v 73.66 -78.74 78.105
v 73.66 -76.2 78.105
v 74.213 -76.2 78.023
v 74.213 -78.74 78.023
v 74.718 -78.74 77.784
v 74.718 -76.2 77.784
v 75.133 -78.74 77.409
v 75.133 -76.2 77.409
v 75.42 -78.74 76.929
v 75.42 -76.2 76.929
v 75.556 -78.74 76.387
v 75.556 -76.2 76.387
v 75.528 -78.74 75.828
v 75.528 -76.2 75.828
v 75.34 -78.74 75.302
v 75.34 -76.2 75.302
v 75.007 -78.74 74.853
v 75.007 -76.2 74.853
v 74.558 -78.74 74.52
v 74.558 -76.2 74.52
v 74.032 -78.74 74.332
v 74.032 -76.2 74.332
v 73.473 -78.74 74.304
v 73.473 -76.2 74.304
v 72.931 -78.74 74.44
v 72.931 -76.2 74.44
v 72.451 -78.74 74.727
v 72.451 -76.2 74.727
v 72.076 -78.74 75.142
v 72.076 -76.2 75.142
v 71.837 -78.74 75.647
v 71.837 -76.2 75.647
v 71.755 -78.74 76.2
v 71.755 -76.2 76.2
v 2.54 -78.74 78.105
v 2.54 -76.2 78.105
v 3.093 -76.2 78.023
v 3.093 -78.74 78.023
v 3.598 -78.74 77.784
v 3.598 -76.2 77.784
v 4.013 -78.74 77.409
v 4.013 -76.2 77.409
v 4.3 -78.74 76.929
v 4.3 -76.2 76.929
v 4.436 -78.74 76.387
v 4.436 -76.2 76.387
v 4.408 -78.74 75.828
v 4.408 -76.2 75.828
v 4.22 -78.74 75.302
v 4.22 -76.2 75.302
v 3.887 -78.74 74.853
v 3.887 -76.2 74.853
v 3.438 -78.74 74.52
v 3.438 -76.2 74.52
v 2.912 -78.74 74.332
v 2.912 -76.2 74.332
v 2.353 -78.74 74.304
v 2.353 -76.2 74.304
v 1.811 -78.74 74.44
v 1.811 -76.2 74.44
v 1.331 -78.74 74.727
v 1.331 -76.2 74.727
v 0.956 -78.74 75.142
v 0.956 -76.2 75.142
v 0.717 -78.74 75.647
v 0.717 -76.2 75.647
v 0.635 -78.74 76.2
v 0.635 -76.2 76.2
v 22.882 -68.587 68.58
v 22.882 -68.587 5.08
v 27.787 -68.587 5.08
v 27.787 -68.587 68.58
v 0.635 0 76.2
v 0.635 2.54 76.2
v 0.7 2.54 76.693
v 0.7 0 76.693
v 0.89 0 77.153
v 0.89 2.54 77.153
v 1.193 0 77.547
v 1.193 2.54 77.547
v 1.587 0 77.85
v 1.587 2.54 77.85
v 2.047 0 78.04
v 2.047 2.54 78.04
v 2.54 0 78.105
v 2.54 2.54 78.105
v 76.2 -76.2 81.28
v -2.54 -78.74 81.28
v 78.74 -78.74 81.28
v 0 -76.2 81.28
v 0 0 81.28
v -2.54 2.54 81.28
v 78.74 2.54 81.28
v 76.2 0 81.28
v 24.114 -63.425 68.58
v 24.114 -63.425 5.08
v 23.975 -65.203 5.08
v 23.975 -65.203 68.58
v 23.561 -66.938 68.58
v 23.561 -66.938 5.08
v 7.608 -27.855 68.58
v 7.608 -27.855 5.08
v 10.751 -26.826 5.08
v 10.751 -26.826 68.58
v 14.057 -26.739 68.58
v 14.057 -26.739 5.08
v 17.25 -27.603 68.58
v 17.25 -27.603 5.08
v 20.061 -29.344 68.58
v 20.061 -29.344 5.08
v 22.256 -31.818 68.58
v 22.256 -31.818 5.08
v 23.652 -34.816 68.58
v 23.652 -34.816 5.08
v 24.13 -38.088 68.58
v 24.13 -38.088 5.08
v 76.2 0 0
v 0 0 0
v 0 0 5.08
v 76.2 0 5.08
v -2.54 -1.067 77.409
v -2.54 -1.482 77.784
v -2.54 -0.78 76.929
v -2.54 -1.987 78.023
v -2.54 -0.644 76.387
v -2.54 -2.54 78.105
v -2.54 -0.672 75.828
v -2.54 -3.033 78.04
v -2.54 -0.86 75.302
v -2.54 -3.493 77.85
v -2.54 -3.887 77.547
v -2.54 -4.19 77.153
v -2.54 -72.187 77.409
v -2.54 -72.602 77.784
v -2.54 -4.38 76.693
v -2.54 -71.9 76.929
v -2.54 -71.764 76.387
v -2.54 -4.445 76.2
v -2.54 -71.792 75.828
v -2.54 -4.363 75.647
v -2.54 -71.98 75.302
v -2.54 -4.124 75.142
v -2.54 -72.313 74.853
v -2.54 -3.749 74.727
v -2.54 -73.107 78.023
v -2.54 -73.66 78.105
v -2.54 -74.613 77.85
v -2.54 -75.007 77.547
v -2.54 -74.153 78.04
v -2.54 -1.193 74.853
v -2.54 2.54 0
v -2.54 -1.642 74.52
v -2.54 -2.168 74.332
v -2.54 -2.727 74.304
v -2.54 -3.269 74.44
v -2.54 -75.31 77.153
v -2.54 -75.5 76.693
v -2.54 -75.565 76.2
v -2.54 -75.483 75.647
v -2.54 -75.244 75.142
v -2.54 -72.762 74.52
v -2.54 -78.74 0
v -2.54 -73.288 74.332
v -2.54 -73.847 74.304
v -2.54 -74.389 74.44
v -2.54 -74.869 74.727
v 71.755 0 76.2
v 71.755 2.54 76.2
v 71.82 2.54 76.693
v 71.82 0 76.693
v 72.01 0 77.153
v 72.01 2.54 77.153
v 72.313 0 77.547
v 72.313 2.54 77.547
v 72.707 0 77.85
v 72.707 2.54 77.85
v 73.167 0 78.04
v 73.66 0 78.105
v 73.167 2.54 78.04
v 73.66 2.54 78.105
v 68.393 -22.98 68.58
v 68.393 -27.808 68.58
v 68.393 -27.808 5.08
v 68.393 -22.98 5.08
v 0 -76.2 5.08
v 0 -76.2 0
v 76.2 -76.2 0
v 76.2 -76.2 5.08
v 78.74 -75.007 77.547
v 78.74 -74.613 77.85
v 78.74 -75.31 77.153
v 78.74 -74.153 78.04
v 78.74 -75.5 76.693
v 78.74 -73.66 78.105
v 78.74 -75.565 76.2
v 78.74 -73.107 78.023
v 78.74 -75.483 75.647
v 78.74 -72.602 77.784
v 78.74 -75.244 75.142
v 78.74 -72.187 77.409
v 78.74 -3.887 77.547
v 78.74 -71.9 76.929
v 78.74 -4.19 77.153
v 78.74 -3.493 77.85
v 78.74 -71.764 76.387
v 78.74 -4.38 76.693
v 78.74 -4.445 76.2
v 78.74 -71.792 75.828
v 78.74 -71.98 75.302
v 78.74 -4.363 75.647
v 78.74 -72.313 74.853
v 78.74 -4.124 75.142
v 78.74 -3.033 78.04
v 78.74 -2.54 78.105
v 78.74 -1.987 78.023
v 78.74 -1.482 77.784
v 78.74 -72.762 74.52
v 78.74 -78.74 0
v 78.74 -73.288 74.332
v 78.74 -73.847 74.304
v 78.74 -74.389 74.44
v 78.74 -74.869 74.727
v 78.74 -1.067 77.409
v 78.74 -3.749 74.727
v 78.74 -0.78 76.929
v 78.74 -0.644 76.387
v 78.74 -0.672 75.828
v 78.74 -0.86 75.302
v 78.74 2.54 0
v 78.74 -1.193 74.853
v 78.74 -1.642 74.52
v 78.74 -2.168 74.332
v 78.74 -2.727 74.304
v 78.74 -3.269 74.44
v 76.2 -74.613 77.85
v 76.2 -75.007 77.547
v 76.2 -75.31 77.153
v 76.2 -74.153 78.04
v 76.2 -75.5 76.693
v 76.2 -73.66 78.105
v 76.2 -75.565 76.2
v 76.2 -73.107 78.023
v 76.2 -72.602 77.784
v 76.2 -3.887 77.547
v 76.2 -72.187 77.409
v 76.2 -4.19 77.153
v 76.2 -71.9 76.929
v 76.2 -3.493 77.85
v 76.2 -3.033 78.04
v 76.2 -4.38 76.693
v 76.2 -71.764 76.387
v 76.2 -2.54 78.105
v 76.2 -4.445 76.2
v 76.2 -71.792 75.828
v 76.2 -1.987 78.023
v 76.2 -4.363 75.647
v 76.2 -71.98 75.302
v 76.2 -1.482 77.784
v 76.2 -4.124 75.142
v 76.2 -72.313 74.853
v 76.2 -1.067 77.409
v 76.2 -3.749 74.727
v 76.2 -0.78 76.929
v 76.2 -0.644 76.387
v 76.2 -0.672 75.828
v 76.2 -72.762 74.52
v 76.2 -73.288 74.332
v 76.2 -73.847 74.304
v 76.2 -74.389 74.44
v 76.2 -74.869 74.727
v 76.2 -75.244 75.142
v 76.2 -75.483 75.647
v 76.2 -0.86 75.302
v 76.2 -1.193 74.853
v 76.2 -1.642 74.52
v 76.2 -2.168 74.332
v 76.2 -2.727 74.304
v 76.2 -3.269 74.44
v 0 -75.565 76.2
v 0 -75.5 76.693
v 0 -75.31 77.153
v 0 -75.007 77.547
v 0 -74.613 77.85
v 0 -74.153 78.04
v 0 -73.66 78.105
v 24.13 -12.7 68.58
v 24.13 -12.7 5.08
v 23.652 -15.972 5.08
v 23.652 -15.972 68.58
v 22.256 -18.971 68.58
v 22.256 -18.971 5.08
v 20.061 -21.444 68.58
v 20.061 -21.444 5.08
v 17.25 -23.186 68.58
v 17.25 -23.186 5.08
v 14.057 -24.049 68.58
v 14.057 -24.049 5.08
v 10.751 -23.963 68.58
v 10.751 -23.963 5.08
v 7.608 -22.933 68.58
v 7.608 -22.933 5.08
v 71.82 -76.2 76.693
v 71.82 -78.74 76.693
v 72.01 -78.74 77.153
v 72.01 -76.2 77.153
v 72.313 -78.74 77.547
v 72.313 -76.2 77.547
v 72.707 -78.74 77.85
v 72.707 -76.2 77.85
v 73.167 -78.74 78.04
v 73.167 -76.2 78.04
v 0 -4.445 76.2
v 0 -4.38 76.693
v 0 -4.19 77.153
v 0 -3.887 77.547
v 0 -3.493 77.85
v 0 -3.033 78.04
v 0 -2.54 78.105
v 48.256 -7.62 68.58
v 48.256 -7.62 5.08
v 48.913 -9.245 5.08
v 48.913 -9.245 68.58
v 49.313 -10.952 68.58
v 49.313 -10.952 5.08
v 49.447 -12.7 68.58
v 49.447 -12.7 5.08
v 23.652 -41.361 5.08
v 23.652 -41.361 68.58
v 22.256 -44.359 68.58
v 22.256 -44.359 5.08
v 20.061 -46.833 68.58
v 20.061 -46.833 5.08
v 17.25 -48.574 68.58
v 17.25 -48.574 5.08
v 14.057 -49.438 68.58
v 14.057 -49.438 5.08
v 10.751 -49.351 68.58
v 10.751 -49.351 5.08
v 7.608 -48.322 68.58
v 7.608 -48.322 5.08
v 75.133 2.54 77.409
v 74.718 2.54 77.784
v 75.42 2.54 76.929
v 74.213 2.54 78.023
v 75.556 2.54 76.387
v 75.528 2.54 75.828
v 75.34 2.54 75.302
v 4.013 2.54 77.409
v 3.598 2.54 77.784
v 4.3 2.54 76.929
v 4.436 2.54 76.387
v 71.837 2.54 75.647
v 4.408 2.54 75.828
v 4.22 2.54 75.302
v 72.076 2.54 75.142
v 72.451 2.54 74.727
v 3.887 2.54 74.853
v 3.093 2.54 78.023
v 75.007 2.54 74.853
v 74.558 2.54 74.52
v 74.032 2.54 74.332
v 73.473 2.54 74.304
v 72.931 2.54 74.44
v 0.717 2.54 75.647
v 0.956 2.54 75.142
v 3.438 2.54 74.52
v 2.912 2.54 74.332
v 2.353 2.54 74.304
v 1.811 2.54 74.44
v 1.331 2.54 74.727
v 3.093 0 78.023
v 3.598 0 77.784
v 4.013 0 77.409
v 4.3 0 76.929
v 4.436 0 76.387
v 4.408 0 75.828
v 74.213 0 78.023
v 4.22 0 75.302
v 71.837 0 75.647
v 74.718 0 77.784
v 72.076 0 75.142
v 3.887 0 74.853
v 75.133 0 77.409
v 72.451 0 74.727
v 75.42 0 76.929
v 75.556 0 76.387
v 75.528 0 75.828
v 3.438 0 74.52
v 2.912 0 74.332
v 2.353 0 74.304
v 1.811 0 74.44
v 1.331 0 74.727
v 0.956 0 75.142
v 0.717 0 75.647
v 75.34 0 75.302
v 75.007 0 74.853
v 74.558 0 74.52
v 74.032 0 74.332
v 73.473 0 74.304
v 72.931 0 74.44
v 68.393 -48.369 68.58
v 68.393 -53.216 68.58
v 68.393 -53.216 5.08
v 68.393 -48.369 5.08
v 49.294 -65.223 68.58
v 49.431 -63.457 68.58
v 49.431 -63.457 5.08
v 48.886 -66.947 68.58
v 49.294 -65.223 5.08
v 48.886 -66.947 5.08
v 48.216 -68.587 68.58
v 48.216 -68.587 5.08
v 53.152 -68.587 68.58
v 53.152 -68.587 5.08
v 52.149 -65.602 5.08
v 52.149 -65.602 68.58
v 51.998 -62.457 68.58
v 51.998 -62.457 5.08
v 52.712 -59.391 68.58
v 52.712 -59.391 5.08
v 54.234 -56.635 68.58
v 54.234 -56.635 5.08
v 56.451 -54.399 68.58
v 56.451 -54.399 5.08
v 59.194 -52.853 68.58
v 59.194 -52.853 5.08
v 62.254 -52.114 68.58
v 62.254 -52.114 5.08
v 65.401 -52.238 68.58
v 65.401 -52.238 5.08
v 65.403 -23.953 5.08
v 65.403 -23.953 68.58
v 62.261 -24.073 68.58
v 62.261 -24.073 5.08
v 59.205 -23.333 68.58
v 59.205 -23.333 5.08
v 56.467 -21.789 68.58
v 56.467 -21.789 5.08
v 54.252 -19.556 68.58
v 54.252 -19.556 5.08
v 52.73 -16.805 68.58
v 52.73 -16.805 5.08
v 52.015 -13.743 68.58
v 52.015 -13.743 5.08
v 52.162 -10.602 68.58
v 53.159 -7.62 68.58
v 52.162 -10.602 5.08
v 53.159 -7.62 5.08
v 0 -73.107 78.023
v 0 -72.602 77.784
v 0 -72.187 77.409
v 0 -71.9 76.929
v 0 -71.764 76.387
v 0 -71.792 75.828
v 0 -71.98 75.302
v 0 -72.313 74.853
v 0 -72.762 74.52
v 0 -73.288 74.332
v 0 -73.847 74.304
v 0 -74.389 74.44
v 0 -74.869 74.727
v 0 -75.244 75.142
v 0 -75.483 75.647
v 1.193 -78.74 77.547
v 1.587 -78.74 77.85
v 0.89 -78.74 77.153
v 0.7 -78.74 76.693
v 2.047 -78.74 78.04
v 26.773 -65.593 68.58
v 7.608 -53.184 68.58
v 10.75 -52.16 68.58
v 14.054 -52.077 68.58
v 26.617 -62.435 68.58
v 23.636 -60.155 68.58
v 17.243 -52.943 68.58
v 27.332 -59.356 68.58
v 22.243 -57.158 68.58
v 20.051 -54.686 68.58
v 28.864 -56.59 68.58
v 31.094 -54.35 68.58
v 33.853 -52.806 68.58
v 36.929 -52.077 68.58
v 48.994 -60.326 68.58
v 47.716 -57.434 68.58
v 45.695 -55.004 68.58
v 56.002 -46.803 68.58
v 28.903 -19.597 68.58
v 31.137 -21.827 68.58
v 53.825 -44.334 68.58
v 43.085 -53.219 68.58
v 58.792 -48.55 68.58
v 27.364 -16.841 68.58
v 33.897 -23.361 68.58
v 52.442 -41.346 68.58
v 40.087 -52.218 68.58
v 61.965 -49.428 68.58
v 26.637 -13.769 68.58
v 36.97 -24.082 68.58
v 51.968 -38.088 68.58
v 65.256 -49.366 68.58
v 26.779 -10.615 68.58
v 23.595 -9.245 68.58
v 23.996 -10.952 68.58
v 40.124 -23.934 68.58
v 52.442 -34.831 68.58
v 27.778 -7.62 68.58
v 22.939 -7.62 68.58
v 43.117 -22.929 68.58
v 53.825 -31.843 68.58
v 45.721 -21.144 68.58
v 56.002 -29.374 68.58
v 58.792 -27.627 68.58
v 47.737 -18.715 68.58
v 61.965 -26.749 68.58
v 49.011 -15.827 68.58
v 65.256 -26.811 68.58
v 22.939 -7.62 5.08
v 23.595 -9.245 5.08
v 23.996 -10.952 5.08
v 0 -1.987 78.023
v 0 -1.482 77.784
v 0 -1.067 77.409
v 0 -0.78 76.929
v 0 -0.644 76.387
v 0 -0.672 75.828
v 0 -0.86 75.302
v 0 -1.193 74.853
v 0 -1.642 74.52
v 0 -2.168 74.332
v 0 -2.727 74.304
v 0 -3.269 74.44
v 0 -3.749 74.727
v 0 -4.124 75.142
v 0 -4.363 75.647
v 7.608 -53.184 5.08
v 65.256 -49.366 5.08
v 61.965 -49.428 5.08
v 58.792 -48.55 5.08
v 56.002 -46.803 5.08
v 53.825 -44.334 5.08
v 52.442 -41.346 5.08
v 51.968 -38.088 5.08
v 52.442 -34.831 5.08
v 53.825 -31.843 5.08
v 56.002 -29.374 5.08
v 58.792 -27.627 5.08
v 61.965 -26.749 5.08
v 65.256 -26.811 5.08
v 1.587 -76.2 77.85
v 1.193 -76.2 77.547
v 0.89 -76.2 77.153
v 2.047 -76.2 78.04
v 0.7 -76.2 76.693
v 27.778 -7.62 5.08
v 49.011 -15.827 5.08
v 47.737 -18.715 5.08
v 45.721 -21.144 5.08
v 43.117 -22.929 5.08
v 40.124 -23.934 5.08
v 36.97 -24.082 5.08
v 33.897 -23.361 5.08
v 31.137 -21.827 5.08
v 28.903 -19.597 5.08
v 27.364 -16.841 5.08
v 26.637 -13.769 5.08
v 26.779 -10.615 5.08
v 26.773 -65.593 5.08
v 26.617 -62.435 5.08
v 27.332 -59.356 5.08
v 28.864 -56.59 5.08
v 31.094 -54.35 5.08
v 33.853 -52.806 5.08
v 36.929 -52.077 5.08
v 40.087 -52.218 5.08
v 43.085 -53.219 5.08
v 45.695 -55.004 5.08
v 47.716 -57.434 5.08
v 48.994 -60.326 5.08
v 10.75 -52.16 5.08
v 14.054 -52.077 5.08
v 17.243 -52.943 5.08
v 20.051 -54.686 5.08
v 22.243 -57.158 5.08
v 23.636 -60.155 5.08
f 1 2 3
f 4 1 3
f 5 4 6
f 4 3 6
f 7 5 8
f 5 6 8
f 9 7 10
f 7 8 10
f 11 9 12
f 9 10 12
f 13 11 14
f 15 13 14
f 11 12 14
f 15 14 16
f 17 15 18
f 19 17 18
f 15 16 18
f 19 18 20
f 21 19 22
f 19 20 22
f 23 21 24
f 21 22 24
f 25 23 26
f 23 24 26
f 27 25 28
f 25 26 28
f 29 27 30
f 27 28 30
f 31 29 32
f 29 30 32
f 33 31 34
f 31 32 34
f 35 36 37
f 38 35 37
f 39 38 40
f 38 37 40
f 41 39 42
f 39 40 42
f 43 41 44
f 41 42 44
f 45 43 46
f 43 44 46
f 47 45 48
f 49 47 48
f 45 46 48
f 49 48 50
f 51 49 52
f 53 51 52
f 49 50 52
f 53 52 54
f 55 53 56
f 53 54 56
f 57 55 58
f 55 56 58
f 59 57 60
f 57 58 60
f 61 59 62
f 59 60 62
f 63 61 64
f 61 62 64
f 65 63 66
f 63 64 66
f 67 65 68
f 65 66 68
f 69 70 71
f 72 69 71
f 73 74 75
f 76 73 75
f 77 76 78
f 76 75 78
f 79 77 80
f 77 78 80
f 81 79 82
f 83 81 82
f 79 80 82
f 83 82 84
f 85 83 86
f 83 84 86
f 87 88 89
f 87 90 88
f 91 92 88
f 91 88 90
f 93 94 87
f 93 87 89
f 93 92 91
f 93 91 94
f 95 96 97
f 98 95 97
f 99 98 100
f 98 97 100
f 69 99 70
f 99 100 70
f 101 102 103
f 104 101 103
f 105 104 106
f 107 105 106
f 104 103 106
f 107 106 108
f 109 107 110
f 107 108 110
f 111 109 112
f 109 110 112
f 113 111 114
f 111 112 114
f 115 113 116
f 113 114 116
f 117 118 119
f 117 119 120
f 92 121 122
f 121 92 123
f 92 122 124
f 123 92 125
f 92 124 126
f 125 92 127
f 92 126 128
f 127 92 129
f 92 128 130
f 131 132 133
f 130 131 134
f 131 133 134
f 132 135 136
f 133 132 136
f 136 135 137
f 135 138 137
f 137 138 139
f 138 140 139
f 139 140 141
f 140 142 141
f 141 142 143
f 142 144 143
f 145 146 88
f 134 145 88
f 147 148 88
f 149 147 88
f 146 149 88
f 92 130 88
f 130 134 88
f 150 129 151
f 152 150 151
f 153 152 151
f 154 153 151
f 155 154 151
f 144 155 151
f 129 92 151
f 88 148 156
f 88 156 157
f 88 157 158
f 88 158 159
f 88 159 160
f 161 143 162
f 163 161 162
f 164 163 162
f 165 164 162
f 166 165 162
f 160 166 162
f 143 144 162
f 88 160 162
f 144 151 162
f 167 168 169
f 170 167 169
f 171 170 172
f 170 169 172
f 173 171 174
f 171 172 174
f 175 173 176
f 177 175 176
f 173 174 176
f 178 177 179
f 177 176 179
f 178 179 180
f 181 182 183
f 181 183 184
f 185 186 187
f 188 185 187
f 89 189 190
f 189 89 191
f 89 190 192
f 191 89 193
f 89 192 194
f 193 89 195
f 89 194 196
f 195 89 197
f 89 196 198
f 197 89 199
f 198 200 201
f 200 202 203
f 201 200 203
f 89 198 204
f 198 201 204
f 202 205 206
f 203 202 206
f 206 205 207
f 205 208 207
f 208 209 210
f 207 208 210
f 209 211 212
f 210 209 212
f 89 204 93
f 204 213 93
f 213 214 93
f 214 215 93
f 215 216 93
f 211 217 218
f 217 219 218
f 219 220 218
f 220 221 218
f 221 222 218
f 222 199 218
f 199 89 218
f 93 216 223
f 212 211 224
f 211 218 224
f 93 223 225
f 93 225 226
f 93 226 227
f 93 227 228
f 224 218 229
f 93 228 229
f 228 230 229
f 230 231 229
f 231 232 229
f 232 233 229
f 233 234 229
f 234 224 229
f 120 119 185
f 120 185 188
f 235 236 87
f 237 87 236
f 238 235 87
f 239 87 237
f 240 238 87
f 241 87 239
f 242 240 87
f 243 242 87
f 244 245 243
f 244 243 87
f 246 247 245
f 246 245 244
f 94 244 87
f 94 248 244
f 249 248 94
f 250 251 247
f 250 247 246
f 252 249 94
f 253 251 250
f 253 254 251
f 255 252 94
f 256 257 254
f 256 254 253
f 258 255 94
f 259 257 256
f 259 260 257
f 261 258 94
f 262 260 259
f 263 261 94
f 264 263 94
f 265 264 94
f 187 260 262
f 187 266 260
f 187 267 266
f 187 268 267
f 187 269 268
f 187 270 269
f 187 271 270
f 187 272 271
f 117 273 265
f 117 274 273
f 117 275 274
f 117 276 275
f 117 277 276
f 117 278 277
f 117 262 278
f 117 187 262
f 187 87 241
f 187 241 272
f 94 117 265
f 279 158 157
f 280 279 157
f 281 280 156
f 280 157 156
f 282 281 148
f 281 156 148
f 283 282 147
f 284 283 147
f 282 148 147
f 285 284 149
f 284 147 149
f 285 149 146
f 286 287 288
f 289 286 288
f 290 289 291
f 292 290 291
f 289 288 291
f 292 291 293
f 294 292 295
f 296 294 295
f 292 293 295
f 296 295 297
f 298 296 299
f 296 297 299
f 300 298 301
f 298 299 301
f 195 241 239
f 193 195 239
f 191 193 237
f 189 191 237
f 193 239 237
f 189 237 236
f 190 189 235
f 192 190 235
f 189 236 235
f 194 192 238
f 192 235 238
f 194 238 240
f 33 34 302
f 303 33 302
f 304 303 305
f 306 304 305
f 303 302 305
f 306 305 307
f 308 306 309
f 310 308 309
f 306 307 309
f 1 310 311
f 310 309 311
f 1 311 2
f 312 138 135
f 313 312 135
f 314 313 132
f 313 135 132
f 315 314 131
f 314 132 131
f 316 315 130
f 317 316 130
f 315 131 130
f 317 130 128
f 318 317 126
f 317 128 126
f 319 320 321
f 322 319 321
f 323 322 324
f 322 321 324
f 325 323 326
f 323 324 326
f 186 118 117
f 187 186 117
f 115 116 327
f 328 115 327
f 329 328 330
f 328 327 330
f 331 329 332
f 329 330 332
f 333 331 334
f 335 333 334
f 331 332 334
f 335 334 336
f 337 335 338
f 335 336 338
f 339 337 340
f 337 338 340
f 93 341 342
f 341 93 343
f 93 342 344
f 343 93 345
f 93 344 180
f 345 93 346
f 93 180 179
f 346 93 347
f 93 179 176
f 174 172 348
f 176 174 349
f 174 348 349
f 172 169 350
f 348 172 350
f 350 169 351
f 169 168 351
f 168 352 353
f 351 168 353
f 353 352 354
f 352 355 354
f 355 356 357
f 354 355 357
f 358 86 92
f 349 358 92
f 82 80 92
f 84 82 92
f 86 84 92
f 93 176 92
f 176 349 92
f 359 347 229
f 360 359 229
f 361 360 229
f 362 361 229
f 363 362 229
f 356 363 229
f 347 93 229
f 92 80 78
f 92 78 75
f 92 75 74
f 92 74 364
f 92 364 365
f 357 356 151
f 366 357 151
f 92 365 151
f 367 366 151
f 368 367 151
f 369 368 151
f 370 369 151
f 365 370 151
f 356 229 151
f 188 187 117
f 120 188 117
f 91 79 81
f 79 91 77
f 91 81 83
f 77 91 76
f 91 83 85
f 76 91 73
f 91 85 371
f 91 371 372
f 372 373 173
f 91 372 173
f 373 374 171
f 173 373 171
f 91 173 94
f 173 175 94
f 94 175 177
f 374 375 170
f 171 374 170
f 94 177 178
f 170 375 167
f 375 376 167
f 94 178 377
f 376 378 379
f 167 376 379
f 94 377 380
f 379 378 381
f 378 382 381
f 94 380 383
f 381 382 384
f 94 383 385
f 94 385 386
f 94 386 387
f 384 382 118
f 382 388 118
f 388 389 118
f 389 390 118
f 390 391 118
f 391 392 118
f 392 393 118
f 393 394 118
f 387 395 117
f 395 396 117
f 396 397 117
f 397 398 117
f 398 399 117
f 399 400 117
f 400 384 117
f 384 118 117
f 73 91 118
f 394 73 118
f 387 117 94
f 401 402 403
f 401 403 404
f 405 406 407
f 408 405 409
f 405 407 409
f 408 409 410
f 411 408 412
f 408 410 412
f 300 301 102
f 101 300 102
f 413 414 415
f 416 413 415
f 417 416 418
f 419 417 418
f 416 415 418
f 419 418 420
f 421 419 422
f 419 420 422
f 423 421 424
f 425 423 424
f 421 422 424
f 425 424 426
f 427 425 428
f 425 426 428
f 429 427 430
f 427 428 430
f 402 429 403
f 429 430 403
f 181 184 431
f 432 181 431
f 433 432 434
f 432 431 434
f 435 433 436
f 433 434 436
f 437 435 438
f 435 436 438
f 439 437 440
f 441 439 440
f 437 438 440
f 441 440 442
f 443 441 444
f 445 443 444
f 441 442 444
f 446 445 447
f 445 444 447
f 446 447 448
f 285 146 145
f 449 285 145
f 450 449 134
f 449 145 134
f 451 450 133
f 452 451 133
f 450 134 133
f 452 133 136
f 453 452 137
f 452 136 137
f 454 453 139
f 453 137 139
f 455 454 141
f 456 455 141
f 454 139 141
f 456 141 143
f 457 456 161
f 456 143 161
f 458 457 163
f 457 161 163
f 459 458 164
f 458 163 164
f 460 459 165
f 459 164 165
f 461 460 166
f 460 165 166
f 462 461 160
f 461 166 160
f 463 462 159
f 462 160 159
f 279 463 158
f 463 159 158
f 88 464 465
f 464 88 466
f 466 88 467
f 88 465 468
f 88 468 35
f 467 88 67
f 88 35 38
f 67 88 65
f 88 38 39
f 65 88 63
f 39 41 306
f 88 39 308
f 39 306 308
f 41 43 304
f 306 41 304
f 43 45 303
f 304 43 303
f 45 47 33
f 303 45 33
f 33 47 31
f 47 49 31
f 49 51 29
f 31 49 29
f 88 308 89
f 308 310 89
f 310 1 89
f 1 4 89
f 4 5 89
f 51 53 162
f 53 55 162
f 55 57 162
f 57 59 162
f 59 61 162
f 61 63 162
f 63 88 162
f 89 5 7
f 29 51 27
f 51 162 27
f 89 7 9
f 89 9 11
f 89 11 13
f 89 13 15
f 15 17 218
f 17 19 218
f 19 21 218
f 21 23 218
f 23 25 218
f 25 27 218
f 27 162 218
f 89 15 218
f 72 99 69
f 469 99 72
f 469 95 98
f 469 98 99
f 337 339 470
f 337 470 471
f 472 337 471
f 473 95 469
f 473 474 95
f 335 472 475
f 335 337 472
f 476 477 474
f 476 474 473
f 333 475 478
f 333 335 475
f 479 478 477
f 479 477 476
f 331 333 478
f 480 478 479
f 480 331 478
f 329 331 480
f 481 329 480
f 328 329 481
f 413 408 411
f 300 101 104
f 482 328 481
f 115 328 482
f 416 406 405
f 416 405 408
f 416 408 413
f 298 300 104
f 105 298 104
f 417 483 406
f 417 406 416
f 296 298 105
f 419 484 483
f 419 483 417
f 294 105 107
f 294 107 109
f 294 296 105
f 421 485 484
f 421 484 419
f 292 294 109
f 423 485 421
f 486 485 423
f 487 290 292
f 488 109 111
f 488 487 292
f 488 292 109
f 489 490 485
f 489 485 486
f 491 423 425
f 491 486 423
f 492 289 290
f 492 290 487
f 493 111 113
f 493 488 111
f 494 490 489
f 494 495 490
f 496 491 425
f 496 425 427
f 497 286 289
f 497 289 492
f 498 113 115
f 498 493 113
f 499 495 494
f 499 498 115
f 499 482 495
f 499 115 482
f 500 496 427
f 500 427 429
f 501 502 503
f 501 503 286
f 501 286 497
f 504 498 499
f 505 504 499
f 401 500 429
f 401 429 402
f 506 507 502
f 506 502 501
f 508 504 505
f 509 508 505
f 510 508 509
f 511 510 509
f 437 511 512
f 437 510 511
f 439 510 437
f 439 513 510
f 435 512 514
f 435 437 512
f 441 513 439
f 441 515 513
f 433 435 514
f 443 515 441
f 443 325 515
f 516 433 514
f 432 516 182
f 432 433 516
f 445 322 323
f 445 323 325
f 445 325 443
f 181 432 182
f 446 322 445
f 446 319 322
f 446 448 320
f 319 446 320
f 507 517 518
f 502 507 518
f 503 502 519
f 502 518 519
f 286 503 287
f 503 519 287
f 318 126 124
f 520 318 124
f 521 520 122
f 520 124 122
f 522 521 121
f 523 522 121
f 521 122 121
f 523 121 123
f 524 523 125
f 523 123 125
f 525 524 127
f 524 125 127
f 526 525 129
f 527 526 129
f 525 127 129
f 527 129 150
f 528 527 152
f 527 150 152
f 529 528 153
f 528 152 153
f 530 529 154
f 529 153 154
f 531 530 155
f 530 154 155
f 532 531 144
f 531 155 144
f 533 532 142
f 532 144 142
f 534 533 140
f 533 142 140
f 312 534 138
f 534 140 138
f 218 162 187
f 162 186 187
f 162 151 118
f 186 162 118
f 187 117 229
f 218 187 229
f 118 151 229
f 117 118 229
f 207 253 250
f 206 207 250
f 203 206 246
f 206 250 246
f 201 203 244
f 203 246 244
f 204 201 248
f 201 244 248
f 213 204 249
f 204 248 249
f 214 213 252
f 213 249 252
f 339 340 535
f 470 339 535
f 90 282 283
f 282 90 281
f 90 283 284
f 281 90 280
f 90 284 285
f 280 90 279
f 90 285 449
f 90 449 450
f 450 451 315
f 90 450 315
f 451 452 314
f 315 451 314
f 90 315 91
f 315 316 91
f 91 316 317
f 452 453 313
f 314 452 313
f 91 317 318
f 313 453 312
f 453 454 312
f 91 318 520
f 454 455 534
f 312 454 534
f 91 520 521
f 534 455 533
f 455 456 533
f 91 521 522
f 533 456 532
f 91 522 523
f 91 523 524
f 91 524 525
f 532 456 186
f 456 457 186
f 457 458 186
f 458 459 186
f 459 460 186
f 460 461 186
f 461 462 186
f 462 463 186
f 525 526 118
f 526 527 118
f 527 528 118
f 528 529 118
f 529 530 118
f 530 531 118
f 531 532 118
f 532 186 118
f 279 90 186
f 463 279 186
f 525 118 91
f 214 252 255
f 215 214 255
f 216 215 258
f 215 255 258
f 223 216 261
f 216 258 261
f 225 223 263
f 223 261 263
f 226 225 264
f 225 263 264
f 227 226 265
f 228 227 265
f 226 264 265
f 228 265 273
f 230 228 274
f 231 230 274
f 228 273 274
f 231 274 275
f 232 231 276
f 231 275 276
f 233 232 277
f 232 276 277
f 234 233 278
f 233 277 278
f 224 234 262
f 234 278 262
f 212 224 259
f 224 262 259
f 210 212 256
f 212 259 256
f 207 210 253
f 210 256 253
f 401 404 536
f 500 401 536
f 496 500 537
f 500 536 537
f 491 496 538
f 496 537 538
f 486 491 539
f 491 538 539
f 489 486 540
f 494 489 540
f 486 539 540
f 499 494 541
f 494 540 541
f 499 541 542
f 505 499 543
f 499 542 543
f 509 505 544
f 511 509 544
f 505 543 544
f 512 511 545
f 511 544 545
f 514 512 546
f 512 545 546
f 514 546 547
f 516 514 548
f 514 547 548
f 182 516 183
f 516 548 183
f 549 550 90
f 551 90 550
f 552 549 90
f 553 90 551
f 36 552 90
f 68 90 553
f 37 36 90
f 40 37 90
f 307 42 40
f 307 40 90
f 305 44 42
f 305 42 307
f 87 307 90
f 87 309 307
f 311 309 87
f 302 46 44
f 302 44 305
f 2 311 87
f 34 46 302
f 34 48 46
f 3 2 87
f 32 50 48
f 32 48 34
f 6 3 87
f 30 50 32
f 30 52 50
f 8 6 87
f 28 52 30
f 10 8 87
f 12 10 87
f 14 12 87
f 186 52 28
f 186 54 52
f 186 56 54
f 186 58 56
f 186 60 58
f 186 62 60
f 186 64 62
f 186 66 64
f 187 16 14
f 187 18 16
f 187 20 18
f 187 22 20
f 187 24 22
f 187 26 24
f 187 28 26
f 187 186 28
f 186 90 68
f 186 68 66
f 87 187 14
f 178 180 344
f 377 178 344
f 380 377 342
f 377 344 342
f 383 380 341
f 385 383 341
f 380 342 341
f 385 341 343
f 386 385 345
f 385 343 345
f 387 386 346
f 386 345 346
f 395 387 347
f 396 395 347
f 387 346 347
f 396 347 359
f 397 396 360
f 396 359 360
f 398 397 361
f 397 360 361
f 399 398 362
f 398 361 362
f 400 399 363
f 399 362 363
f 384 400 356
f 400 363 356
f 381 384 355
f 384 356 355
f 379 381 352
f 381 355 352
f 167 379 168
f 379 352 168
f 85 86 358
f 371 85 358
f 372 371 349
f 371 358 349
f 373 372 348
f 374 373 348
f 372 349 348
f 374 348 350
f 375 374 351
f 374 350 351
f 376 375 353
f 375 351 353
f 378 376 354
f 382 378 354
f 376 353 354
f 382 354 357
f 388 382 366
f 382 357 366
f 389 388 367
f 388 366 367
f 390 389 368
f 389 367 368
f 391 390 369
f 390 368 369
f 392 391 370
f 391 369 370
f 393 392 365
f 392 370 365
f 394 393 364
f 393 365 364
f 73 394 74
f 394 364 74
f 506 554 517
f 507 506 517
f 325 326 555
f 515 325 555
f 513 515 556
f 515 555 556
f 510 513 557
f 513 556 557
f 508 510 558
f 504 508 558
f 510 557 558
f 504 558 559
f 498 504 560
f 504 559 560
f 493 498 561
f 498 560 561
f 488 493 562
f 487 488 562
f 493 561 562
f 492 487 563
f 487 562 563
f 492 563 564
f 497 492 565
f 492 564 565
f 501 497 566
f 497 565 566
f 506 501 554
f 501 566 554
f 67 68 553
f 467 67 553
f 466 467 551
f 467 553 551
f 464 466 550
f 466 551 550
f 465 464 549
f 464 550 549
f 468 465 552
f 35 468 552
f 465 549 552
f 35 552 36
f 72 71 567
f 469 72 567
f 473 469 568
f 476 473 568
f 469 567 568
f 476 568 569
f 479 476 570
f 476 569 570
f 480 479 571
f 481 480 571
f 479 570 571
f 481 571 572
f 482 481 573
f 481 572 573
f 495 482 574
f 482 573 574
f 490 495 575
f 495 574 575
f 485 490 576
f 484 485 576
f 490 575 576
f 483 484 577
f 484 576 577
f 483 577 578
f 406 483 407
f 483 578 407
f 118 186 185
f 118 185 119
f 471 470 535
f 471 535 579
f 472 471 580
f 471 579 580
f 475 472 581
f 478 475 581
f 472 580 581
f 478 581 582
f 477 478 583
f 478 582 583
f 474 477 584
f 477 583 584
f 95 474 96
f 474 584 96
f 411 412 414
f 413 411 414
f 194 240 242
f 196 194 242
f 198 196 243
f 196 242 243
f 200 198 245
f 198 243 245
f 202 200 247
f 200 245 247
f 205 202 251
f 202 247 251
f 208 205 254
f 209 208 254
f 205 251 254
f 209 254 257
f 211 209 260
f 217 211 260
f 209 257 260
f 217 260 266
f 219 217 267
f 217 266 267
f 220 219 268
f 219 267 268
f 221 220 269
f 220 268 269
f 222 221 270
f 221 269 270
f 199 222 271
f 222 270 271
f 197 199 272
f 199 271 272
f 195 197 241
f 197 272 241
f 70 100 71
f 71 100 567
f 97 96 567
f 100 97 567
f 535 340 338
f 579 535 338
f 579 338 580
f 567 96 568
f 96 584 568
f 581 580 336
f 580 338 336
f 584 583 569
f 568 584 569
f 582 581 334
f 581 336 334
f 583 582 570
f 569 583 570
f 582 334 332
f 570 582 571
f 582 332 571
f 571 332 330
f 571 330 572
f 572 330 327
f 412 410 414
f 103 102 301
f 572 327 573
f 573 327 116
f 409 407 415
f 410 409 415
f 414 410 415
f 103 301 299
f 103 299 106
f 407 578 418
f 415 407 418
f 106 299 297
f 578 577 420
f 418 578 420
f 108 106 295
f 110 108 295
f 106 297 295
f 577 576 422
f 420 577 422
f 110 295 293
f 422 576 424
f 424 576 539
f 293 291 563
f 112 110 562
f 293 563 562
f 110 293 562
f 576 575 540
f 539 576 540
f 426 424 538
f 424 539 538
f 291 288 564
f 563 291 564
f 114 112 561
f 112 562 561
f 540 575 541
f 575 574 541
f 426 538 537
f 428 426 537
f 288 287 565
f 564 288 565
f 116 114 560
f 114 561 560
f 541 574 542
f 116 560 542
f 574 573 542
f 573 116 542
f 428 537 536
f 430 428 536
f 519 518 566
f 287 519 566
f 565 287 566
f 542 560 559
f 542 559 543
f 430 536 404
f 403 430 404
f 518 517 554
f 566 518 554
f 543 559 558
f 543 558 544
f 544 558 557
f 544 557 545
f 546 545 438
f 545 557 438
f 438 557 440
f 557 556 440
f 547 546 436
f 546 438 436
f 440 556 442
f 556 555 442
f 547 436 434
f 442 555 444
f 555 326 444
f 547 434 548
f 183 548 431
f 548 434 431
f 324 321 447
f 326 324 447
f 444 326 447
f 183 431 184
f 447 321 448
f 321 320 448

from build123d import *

# Parameters (mm, degrees)
F0_W      = 76.2
F0_H      = 76.2
F1_DEPTH  = 81.28
F2_W      = 76.2
F2_H      = 76.2
F3_DEPTH  = 5.08
F6_DEPTH  = 81.281
F8_DEPTH  = 81.281
F10_DEPTH = 81.281
F12_DEPTH = 81.281
F13_DEPTH = 63.5


with BuildPart() as f1:
    # F0 (on Top) → F1 (new body)
    with BuildSketch(Plane.XY):
        Polygon((78.74, 2.54), (0, 2.54), (-2.54, 2.54), (-2.54, -78.74), (78.74, -78.74), align=None)
        with Locations((38.1, -38.1)):
            Rectangle(F0_W, F0_H, mode=Mode.SUBTRACT)
    extrude(amount=F1_DEPTH)

    # F5 (on face) → F6 (cut, through all)
    with BuildSketch(Plane(origin=(-2.54, 0, 0), x_dir=(0, -1, 0), z_dir=(-1, 0, 0))):
        with BuildLine():
            ThreePointArc((4.445, 76.2), (3.8870384182, 77.5470384182), (2.54, 78.105))
            ThreePointArc((2.54, 78.105), (1.1929615818, 74.8529615818), (4.445, 76.2))
        make_face()
    extrude(amount=-F6_DEPTH, mode=Mode.SUBTRACT)

    # F7 (on face) → F8 (cut, through all)
    with BuildSketch(Plane(origin=(0, 2.54, 0), x_dir=(-1, 0, 0), z_dir=(0, 1, 0))):
        with BuildLine():
            ThreePointArc((-0.635, 76.2), (-1.1929615818, 77.5470384182), (-2.54, 78.105))
            ThreePointArc((-2.54, 78.105), (-3.8870384182, 74.8529615818), (-0.635, 76.2))
        make_face()
    extrude(amount=-F8_DEPTH, mode=Mode.SUBTRACT)

    # F9 (on face) → F10 (cut, through all)
    with BuildSketch(Plane(origin=(0, 2.54, 0), x_dir=(-1, 0, 0), z_dir=(0, 1, 0))):
        with BuildLine():
            ThreePointArc((-71.755, 76.2), (-72.3129615818, 77.5470384182), (-73.66, 78.105))
            ThreePointArc((-73.66, 78.105), (-75.0070384182, 74.8529615818), (-71.755, 76.2))
        make_face()
    extrude(amount=-F10_DEPTH, mode=Mode.SUBTRACT)

    # F11 (on face) → F12 (cut, through all)
    with BuildSketch(Plane(origin=(-2.54, 0, 0), x_dir=(0, -1, 0), z_dir=(-1, 0, 0))):
        with BuildLine():
            ThreePointArc((75.565, 76.2), (75.0070384182, 77.5470384182), (73.66, 78.105))
            ThreePointArc((73.66, 78.105), (72.3129615818, 74.8529615818), (75.565, 76.2))
        make_face()
    extrude(amount=-F12_DEPTH, mode=Mode.SUBTRACT)


with BuildPart() as f3:
    # F2 (on Top) → F3 (new body)
    with BuildSketch(Plane.XY):
        with Locations((38.1, -38.1)):
            Rectangle(F2_W, F2_H)
    extrude(amount=F3_DEPTH)


with BuildPart() as f13:
    # F4 (on face) → F13 (new body)
    with BuildSketch(Plane.XY.offset(5.08)):
        with BuildLine():
            ThreePointArc((22.9390673403, -7.62), (23.8282846769, -10.0911343174), (24.13, -12.7))
            ThreePointArc((24.13, -12.7), (18.7186363664, -22.4170425691), (7.6084048487, -22.9333063482))
            Line((7.6084048487, -22.9333063482), (7.6084048487, -27.8551705549))
            ThreePointArc((7.6084048487, -27.8551705549), (18.7186363664, -28.371434334), (24.13, -38.0884769031))
            ThreePointArc((24.13, -38.0884769031), (18.7186363664, -47.8055194722), (7.6084048487, -48.3217832513))
            Line((7.6084048487, -48.3217832513), (7.6084048487, -53.1836055481))
            ThreePointArc((7.6084048487, -53.1836055481), (18.7102767186, -53.7124476273), (24.1140926837, -63.4248111901))
            ThreePointArc((24.1140926837, -63.4248111901), (23.8018289528, -66.078269358), (22.8820996393, -68.5867443681))
            Line((22.8820996393, -68.5867443681), (27.7874381008, -68.5867443681))
            ThreePointArc((27.7874381008, -68.5867443681), (35.3653349122, -52.334746614), (49.4314745047, -63.4566020369))
            ThreePointArc((49.4314745047, -63.4566020369), (49.1233299277, -66.0927416294), (48.2155109087, -68.5867443681))
            Line((48.2155109087, -68.5867443681), (53.1517990323, -68.5867443681))
            ThreePointArc((53.1517990323, -68.5867443681), (55.265455445, -55.4404802221), (68.3933794498, -53.2157519802))
            Line((68.3933794498, -53.2157519802), (68.3933794498, -48.3689614721))
            ThreePointArc((68.3933794498, -48.3689614721), (51.9677276379, -38.0884769031), (68.3933794498, -27.8079923341))
            Line((68.3933794498, -27.8079923341), (68.3933794498, -22.980484569))
            ThreePointArc((68.3933794498, -22.980484569), (55.2823426717, -20.7489394861), (53.1586602976, -7.62))
            Line((53.1586602976, -7.62), (48.2564691212, -7.62))
            ThreePointArc((48.2564691212, -7.62), (49.1456864577, -10.0911343174), (49.4474017808, -12.7))
            ThreePointArc((49.4474017808, -12.7), (35.4085360982, -23.8282846769), (27.7783344405, -7.62))
            Line((27.7783344405, -7.62), (22.9390673403, -7.62))
        make_face()
    extrude(amount=F13_DEPTH)


solid = Compound([f1.part, f3.part, f13.part])
